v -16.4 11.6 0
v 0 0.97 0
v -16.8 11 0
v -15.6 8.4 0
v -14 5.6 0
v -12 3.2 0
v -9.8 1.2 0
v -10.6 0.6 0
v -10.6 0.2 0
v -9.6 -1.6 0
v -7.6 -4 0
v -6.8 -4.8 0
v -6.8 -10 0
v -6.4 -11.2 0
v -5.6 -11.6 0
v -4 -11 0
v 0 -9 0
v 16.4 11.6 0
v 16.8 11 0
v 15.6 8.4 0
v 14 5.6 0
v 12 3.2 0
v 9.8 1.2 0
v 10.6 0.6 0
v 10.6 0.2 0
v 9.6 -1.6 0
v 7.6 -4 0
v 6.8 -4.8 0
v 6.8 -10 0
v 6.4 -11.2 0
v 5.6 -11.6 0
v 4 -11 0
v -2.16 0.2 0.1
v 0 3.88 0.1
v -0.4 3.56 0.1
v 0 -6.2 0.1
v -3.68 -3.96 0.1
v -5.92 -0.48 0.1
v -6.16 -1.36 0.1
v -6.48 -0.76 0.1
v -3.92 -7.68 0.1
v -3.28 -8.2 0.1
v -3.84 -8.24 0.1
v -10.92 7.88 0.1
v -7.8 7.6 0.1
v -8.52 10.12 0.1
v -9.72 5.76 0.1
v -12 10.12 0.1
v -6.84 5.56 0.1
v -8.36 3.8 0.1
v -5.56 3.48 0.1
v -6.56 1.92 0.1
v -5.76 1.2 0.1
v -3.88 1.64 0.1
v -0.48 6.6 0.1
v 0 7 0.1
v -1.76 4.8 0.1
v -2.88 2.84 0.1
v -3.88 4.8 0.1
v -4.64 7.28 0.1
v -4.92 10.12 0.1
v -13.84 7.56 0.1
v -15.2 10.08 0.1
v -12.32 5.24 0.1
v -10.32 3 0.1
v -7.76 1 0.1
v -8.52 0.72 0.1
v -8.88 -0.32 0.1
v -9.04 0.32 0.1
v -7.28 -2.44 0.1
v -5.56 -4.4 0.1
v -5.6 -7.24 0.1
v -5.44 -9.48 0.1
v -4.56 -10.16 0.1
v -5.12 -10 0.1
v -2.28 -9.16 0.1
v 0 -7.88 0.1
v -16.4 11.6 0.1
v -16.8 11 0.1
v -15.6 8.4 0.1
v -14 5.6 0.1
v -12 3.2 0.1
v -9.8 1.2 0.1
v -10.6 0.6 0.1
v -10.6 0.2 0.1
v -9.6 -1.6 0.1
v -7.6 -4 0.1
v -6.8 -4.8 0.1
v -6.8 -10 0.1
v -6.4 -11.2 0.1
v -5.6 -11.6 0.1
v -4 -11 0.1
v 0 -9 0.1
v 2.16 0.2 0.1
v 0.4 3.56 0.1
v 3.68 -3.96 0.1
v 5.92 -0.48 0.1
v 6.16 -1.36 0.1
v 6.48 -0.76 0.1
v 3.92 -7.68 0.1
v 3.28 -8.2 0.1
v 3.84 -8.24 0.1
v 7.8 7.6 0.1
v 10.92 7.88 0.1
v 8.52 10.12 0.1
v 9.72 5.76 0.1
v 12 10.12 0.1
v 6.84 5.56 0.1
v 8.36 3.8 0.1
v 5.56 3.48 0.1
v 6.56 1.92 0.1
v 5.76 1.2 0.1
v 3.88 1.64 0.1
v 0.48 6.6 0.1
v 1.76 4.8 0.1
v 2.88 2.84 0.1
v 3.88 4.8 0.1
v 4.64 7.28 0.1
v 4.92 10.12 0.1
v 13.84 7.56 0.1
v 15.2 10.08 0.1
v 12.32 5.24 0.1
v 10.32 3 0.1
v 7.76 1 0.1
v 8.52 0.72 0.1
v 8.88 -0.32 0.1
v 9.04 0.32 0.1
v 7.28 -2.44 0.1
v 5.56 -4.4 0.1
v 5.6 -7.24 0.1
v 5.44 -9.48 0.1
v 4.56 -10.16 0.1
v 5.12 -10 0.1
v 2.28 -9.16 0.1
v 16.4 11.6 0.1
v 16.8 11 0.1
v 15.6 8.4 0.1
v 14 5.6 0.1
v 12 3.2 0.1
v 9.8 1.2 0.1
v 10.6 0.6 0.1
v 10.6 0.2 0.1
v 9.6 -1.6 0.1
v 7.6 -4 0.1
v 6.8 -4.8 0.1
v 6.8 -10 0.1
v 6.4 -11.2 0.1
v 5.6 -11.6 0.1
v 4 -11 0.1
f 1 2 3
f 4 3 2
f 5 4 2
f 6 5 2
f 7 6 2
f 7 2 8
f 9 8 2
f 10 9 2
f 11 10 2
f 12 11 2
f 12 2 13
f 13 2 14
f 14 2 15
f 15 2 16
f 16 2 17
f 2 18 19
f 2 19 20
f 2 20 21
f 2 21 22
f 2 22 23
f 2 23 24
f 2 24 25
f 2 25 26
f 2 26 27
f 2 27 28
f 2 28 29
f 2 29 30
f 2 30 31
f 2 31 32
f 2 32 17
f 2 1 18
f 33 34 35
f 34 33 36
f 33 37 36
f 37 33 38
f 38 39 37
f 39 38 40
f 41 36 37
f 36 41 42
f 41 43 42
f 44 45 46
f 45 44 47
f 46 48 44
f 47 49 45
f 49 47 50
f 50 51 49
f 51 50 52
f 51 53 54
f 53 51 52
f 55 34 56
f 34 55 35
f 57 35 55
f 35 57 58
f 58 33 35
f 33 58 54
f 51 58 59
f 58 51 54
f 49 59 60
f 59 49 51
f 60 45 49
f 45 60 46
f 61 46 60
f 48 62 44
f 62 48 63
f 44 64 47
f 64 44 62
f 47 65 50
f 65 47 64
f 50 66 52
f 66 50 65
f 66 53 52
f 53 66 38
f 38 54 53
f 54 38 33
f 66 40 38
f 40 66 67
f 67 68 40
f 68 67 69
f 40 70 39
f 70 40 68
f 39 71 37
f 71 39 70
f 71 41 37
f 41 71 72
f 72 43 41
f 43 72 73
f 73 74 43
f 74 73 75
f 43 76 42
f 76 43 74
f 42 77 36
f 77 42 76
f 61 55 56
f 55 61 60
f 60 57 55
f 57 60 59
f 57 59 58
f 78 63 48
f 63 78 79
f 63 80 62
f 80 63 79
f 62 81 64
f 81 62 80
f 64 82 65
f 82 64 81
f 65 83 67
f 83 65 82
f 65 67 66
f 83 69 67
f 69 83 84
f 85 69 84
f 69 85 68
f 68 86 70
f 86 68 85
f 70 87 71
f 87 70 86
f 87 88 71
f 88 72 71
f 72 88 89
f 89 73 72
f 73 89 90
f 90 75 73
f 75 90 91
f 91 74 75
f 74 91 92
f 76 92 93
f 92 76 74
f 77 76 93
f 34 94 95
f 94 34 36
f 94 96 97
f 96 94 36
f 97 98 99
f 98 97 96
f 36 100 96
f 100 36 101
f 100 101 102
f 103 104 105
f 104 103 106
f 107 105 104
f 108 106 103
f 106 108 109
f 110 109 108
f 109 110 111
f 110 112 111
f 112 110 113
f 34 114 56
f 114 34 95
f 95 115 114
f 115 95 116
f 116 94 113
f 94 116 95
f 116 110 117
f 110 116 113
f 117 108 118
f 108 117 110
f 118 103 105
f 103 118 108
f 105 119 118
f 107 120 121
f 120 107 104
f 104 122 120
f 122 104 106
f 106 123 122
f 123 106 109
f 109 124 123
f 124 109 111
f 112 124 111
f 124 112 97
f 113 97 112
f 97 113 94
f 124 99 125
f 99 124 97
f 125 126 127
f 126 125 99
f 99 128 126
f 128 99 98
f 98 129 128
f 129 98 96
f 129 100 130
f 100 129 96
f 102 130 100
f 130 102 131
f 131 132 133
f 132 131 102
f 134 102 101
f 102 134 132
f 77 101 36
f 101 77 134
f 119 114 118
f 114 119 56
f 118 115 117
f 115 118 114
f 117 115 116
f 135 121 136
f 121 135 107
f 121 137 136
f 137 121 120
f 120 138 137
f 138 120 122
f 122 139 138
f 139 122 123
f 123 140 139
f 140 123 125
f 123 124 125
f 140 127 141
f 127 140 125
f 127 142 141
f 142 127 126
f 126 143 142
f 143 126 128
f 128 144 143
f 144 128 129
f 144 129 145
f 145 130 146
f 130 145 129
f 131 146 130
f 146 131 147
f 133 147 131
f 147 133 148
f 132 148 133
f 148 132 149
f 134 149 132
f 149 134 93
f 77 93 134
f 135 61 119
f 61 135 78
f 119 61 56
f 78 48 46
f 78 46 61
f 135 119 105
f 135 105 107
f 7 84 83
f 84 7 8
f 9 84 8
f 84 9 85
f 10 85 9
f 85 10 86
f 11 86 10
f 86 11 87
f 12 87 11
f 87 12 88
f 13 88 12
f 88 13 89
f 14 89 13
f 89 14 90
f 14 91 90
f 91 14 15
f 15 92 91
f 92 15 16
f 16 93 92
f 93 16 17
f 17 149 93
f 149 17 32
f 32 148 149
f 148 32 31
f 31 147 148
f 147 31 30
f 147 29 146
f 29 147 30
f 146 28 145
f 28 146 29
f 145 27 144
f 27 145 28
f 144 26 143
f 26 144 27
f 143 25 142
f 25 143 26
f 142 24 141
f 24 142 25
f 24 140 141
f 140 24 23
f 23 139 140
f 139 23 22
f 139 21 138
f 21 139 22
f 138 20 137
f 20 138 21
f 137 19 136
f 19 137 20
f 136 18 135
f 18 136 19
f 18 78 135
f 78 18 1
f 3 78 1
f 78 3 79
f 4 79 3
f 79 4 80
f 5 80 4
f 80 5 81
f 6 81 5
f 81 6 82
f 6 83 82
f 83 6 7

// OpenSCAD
use <../lib.scad>
function ldraw_lib__4620855a() = [
// 0 Sticker  2.9 x  4.2 with Orange and Yellow Shooting Star
// 0 Name: 4620855a.dat
// 0 Author: Takeshi Takahashi [RainbowDolphin]
// 0 !LDRAW_ORG Part UPDATE 2020-03
// 0 !LICENSE Licensed under CC BY 2.0 and CC BY 4.0 : see CAreadme.txt
// 
// 0 BFC CERTIFY CCW
  [0,"BFC","CERTIFY"],
  [0,"BFC","CCW"],
// 
// 0 !KEYWORDS Car, Convertible, Set 3183, Vehicle
// 
// 0 !HISTORY 2020-12-29 [PTadmin] Official Update 2020-03
// 
// 
// 3 16 -41 0 29 0 0 2.426 -42 0 27.5
  [3,16,-41,0,29,0,0,2.426,-42,0,27.5],
// 3 16 -39 0 21 -42 0 27.5 0 0 2.426
  [3,16,-39,0,21,-42,0,27.5,0,0,2.426],
// 3 16 -35 0 14 -39 0 21 0 0 2.426
  [3,16,-35,0,14,-39,0,21,0,0,2.426],
// 3 16 -30 0 8 -35 0 14 0 0 2.426
  [3,16,-30,0,8,-35,0,14,0,0,2.426],
// 3 16 -24.5 0 3 -30 0 8 0 0 2.426
  [3,16,-24.5,0,3,-30,0,8,0,0,2.426],
// 3 16 -24.5 0 3 0 0 2.426 -26.5 0 1.5
  [3,16,-24.5,0,3,0,0,2.426,-26.5,0,1.5],
// 3 16 -26.5 0 .5 -26.5 0 1.5 0 0 2.426
  [3,16,-26.5,0,.5,-26.5,0,1.5,0,0,2.426],
// 3 16 -24 0 -4 -26.5 0 .5 0 0 2.426
  [3,16,-24,0,-4,-26.5,0,.5,0,0,2.426],
// 3 16 -19 0 -10 -24 0 -4 0 0 2.426
  [3,16,-19,0,-10,-24,0,-4,0,0,2.426],
// 3 16 -17 0 -12 -19 0 -10 0 0 2.426
  [3,16,-17,0,-12,-19,0,-10,0,0,2.426],
// 3 16 -17 0 -12 0 0 2.426 -17 0 -25
  [3,16,-17,0,-12,0,0,2.426,-17,0,-25],
// 3 16 -17 0 -25 0 0 2.426 -16 0 -28
  [3,16,-17,0,-25,0,0,2.426,-16,0,-28],
// 3 16 -16 0 -28 0 0 2.426 -14 0 -29
  [3,16,-16,0,-28,0,0,2.426,-14,0,-29],
// 3 16 -14 0 -29 0 0 2.426 -10 0 -27.5
  [3,16,-14,0,-29,0,0,2.426,-10,0,-27.5],
// 3 16 -10 0 -27.5 0 0 2.426 0 0 -22.5
  [3,16,-10,0,-27.5,0,0,2.426,0,0,-22.5],
// 3 16 0 0 2.426 41 0 29 42 0 27.5
  [3,16,0,0,2.426,41,0,29,42,0,27.5],
// 3 16 0 0 2.426 42 0 27.5 39 0 21
  [3,16,0,0,2.426,42,0,27.5,39,0,21],
// 3 16 0 0 2.426 39 0 21 35 0 14
  [3,16,0,0,2.426,39,0,21,35,0,14],
// 3 16 0 0 2.426 35 0 14 30 0 8
  [3,16,0,0,2.426,35,0,14,30,0,8],
// 3 16 0 0 2.426 30 0 8 24.5 0 3
  [3,16,0,0,2.426,30,0,8,24.5,0,3],
// 3 16 0 0 2.426 24.5 0 3 26.5 0 1.5
  [3,16,0,0,2.426,24.5,0,3,26.5,0,1.5],
// 3 16 0 0 2.426 26.5 0 1.5 26.5 0 .5
  [3,16,0,0,2.426,26.5,0,1.5,26.5,0,.5],
// 3 16 0 0 2.426 26.5 0 .5 24 0 -4
  [3,16,0,0,2.426,26.5,0,.5,24,0,-4],
// 3 16 0 0 2.426 24 0 -4 19 0 -10
  [3,16,0,0,2.426,24,0,-4,19,0,-10],
// 3 16 0 0 2.426 19 0 -10 17 0 -12
  [3,16,0,0,2.426,19,0,-10,17,0,-12],
// 3 16 0 0 2.426 17 0 -12 17 0 -25
  [3,16,0,0,2.426,17,0,-12,17,0,-25],
// 3 16 0 0 2.426 17 0 -25 16 0 -28
  [3,16,0,0,2.426,17,0,-25,16,0,-28],
// 3 16 0 0 2.426 16 0 -28 14 0 -29
  [3,16,0,0,2.426,16,0,-28,14,0,-29],
// 3 16 0 0 2.426 14 0 -29 10 0 -27.5
  [3,16,0,0,2.426,14,0,-29,10,0,-27.5],
// 3 16 0 0 2.426 10 0 -27.5 0 0 -22.5
  [3,16,0,0,2.426,10,0,-27.5,0,0,-22.5],
// 3 16 0 0 2.426 -41 0 29 41 0 29
  [3,16,0,0,2.426,-41,0,29,41,0,29],
// 4 25 0 -.25 -15.5 0 -.25 9.7 -1 -.25 8.9 -5.4 -.25 .5
  [4,25,0,-.25,-15.5,0,-.25,9.7,-1,-.25,8.9,-5.4,-.25,.5],
// 4 25 -9.2 -.25 -9.9 0 -.25 -15.5 -5.4 -.25 .5 -14.8 -.25 -1.2
  [4,25,-9.2,-.25,-9.9,0,-.25,-15.5,-5.4,-.25,.5,-14.8,-.25,-1.2],
// 4 25 -15.4 -.25 -3.4 -9.2 -.25 -9.9 -14.8 -.25 -1.2 -16.2 -.25 -1.9
  [4,25,-15.4,-.25,-3.4,-9.2,-.25,-9.9,-14.8,-.25,-1.2,-16.2,-.25,-1.9],
// 4 25 0 -.25 -15.5 -9.2 -.25 -9.9 -9.8 -.25 -19.2 -8.2 -.25 -20.5
  [4,25,0,-.25,-15.5,-9.2,-.25,-9.9,-9.8,-.25,-19.2,-8.2,-.25,-20.5],
// 3 25 -9.8 -.25 -19.2 -9.6 -.25 -20.6 -8.2 -.25 -20.5
  [3,25,-9.8,-.25,-19.2,-9.6,-.25,-20.6,-8.2,-.25,-20.5],
// 4 25 -27.3 -.25 19.7 -24.3 -.25 14.4 -19.5 -.25 19 -21.3 -.25 25.3
  [4,25,-27.3,-.25,19.7,-24.3,-.25,14.4,-19.5,-.25,19,-21.3,-.25,25.3],
// 3 25 -21.3 -.25 25.3 -30 -.25 25.3 -27.3 -.25 19.7
  [3,25,-21.3,-.25,25.3,-30,-.25,25.3,-27.3,-.25,19.7],
// 4 25 -17.1 -.25 13.9 -19.5 -.25 19 -24.3 -.25 14.4 -20.9 -.25 9.5
  [4,25,-17.1,-.25,13.9,-19.5,-.25,19,-24.3,-.25,14.4,-20.9,-.25,9.5],
// 4 25 -13.9 -.25 8.7 -17.1 -.25 13.9 -20.9 -.25 9.5 -16.4 -.25 4.8
  [4,25,-13.9,-.25,8.7,-17.1,-.25,13.9,-20.9,-.25,9.5,-16.4,-.25,4.8],
// 4 25 -9.7 -.25 4.1 -13.9 -.25 8.7 -16.4 -.25 4.8 -14.4 -.25 3
  [4,25,-9.7,-.25,4.1,-13.9,-.25,8.7,-16.4,-.25,4.8,-14.4,-.25,3],
// 4 14 0 -.25 9.7 0 -.25 17.5 -1.2 -.25 16.5 -1 -.25 8.9
  [4,14,0,-.25,9.7,0,-.25,17.5,-1.2,-.25,16.5,-1,-.25,8.9],
// 4 14 -1 -.25 8.9 -1.2 -.25 16.5 -4.4 -.25 12 -7.2 -.25 7.1
  [4,14,-1,-.25,8.9,-1.2,-.25,16.5,-4.4,-.25,12,-7.2,-.25,7.1],
// 4 14 -5.4 -.25 .5 -1 -.25 8.9 -7.2 -.25 7.1 -9.7 -.25 4.1
  [4,14,-5.4,-.25,.5,-1,-.25,8.9,-7.2,-.25,7.1,-9.7,-.25,4.1],
// 4 14 -13.9 -.25 8.7 -9.7 -.25 4.1 -7.2 -.25 7.1 -9.7 -.25 12
  [4,14,-13.9,-.25,8.7,-9.7,-.25,4.1,-7.2,-.25,7.1,-9.7,-.25,12],
// 4 14 -17.1 -.25 13.9 -13.9 -.25 8.7 -9.7 -.25 12 -11.6 -.25 18.2
  [4,14,-17.1,-.25,13.9,-13.9,-.25,8.7,-9.7,-.25,12,-11.6,-.25,18.2],
// 4 14 -19.5 -.25 19 -17.1 -.25 13.9 -11.6 -.25 18.2 -21.3 -.25 25.3
  [4,14,-19.5,-.25,19,-17.1,-.25,13.9,-11.6,-.25,18.2,-21.3,-.25,25.3],
// 3 14 -12.3 -.25 25.3 -21.3 -.25 25.3 -11.6 -.25 18.2
  [3,14,-12.3,-.25,25.3,-21.3,-.25,25.3,-11.6,-.25,18.2],
// 4 14 -27.3 -.25 19.7 -30 -.25 25.3 -38 -.25 25.2 -34.6 -.25 18.9
  [4,14,-27.3,-.25,19.7,-30,-.25,25.3,-38,-.25,25.2,-34.6,-.25,18.9],
// 4 14 -24.3 -.25 14.4 -27.3 -.25 19.7 -34.6 -.25 18.9 -30.8 -.25 13.1
  [4,14,-24.3,-.25,14.4,-27.3,-.25,19.7,-34.6,-.25,18.9,-30.8,-.25,13.1],
// 4 14 -20.9 -.25 9.5 -24.3 -.25 14.4 -30.8 -.25 13.1 -25.8 -.25 7.5
  [4,14,-20.9,-.25,9.5,-24.3,-.25,14.4,-30.8,-.25,13.1,-25.8,-.25,7.5],
// 4 14 -16.4 -.25 4.8 -20.9 -.25 9.5 -25.8 -.25 7.5 -19.4 -.25 2.5
  [4,14,-16.4,-.25,4.8,-20.9,-.25,9.5,-25.8,-.25,7.5,-19.4,-.25,2.5],
// 4 14 -14.4 -.25 3 -16.4 -.25 4.8 -19.4 -.25 2.5 -14.8 -.25 -1.2
  [4,14,-14.4,-.25,3,-16.4,-.25,4.8,-19.4,-.25,2.5,-14.8,-.25,-1.2],
// 4 14 -9.7 -.25 4.1 -14.4 -.25 3 -14.8 -.25 -1.2 -5.4 -.25 .5
  [4,14,-9.7,-.25,4.1,-14.4,-.25,3,-14.8,-.25,-1.2,-5.4,-.25,.5],
// 4 14 -16.2 -.25 -1.9 -14.8 -.25 -1.2 -19.4 -.25 2.5 -21.3 -.25 1.8
  [4,14,-16.2,-.25,-1.9,-14.8,-.25,-1.2,-19.4,-.25,2.5,-21.3,-.25,1.8],
// 4 14 -16.2 -.25 -1.9 -21.3 -.25 1.8 -22.6 -.25 .8 -22.2 -.25 -.8
  [4,14,-16.2,-.25,-1.9,-21.3,-.25,1.8,-22.6,-.25,.8,-22.2,-.25,-.8],
// 4 14 -15.4 -.25 -3.4 -16.2 -.25 -1.9 -22.2 -.25 -.8 -18.2 -.25 -6.1
  [4,14,-15.4,-.25,-3.4,-16.2,-.25,-1.9,-22.2,-.25,-.8,-18.2,-.25,-6.1],
// 4 14 -9.2 -.25 -9.9 -15.4 -.25 -3.4 -18.2 -.25 -6.1 -13.9 -.25 -11
  [4,14,-9.2,-.25,-9.9,-15.4,-.25,-3.4,-18.2,-.25,-6.1,-13.9,-.25,-11],
// 4 14 -9.8 -.25 -19.2 -9.2 -.25 -9.9 -13.9 -.25 -11 -14 -.25 -18.1
  [4,14,-9.8,-.25,-19.2,-9.2,-.25,-9.9,-13.9,-.25,-11,-14,-.25,-18.1],
// 4 14 -9.6 -.25 -20.6 -9.8 -.25 -19.2 -14 -.25 -18.1 -13.6 -.25 -23.7
  [4,14,-9.6,-.25,-20.6,-9.8,-.25,-19.2,-14,-.25,-18.1,-13.6,-.25,-23.7],
// 4 14 -9.6 -.25 -20.6 -13.6 -.25 -23.7 -12.8 -.25 -25 -11.4 -.25 -25.4
  [4,14,-9.6,-.25,-20.6,-13.6,-.25,-23.7,-12.8,-.25,-25,-11.4,-.25,-25.4],
// 4 14 -8.2 -.25 -20.5 -9.6 -.25 -20.6 -11.4 -.25 -25.4 -5.7 -.25 -22.9
  [4,14,-8.2,-.25,-20.5,-9.6,-.25,-20.6,-11.4,-.25,-25.4,-5.7,-.25,-22.9],
// 4 14 0 -.25 -15.5 -8.2 -.25 -20.5 -5.7 -.25 -22.9 0 -.25 -19.7
  [4,14,0,-.25,-15.5,-8.2,-.25,-20.5,-5.7,-.25,-22.9,0,-.25,-19.7],
// 4 30 0 -.25 17.5 -12.3 -.25 25.3 -11.6 -.25 18.2 -1.2 -.25 16.5
  [4,30,0,-.25,17.5,-12.3,-.25,25.3,-11.6,-.25,18.2,-1.2,-.25,16.5],
// 4 30 -1.2 -.25 16.5 -11.6 -.25 18.2 -9.7 -.25 12 -4.4 -.25 12
  [4,30,-1.2,-.25,16.5,-11.6,-.25,18.2,-9.7,-.25,12,-4.4,-.25,12],
// 3 30 -4.4 -.25 12 -9.7 -.25 12 -7.2 -.25 7.1
  [3,30,-4.4,-.25,12,-9.7,-.25,12,-7.2,-.25,7.1],
// 4 30 -38 -.25 25.2 -30 -.25 25.3 -41 -.25 29 -42 -.25 27.5
  [4,30,-38,-.25,25.2,-30,-.25,25.3,-41,-.25,29,-42,-.25,27.5],
// 4 30 -38 -.25 25.2 -42 -.25 27.5 -39 -.25 21 -34.6 -.25 18.9
  [4,30,-38,-.25,25.2,-42,-.25,27.5,-39,-.25,21,-34.6,-.25,18.9],
// 4 30 -34.6 -.25 18.9 -39 -.25 21 -35 -.25 14 -30.8 -.25 13.1
  [4,30,-34.6,-.25,18.9,-39,-.25,21,-35,-.25,14,-30.8,-.25,13.1],
// 4 30 -30.8 -.25 13.1 -35 -.25 14 -30 -.25 8 -25.8 -.25 7.5
  [4,30,-30.8,-.25,13.1,-35,-.25,14,-30,-.25,8,-25.8,-.25,7.5],
// 4 30 -25.8 -.25 7.5 -30 -.25 8 -24.5 -.25 3 -21.3 -.25 1.8
  [4,30,-25.8,-.25,7.5,-30,-.25,8,-24.5,-.25,3,-21.3,-.25,1.8],
// 3 30 -25.8 -.25 7.5 -21.3 -.25 1.8 -19.4 -.25 2.5
  [3,30,-25.8,-.25,7.5,-21.3,-.25,1.8,-19.4,-.25,2.5],
// 4 30 -22.6 -.25 .8 -21.3 -.25 1.8 -24.5 -.25 3 -26.5 -.25 1.5
  [4,30,-22.6,-.25,.8,-21.3,-.25,1.8,-24.5,-.25,3,-26.5,-.25,1.5],
// 4 30 -22.6 -.25 .8 -26.5 -.25 1.5 -26.5 -.25 .5 -22.2 -.25 -.8
  [4,30,-22.6,-.25,.8,-26.5,-.25,1.5,-26.5,-.25,.5,-22.2,-.25,-.8],
// 4 30 -22.2 -.25 -.8 -26.5 -.25 .5 -24 -.25 -4 -18.2 -.25 -6.1
  [4,30,-22.2,-.25,-.8,-26.5,-.25,.5,-24,-.25,-4,-18.2,-.25,-6.1],
// 4 30 -18.2 -.25 -6.1 -24 -.25 -4 -19 -.25 -10 -13.9 -.25 -11
  [4,30,-18.2,-.25,-6.1,-24,-.25,-4,-19,-.25,-10,-13.9,-.25,-11],
// 3 30 -19 -.25 -10 -17 -.25 -12 -13.9 -.25 -11
  [3,30,-19,-.25,-10,-17,-.25,-12,-13.9,-.25,-11],
// 4 30 -14 -.25 -18.1 -13.9 -.25 -11 -17 -.25 -12 -17 -.25 -25
  [4,30,-14,-.25,-18.1,-13.9,-.25,-11,-17,-.25,-12,-17,-.25,-25],
// 4 30 -13.6 -.25 -23.7 -14 -.25 -18.1 -17 -.25 -25 -16 -.25 -28
  [4,30,-13.6,-.25,-23.7,-14,-.25,-18.1,-17,-.25,-25,-16,-.25,-28],
// 4 30 -12.8 -.25 -25 -13.6 -.25 -23.7 -16 -.25 -28 -14 -.25 -29
  [4,30,-12.8,-.25,-25,-13.6,-.25,-23.7,-16,-.25,-28,-14,-.25,-29],
// 4 30 -11.4 -.25 -25.4 -12.8 -.25 -25 -14 -.25 -29 -10 -.25 -27.5
  [4,30,-11.4,-.25,-25.4,-12.8,-.25,-25,-14,-.25,-29,-10,-.25,-27.5],
// 4 30 -5.7 -.25 -22.9 -11.4 -.25 -25.4 -10 -.25 -27.5 0 -.25 -22.5
  [4,30,-5.7,-.25,-22.9,-11.4,-.25,-25.4,-10,-.25,-27.5,0,-.25,-22.5],
// 3 30 0 -.25 -19.7 -5.7 -.25 -22.9 0 -.25 -22.5
  [3,30,0,-.25,-19.7,-5.7,-.25,-22.9,0,-.25,-22.5],
// 4 25 1 -.25 8.9 0 -.25 9.7 0 -.25 -15.5 5.4 -.25 .5
  [4,25,1,-.25,8.9,0,-.25,9.7,0,-.25,-15.5,5.4,-.25,.5],
// 4 25 5.4 -.25 .5 0 -.25 -15.5 9.2 -.25 -9.9 14.8 -.25 -1.2
  [4,25,5.4,-.25,.5,0,-.25,-15.5,9.2,-.25,-9.9,14.8,-.25,-1.2],
// 4 25 14.8 -.25 -1.2 9.2 -.25 -9.9 15.4 -.25 -3.4 16.2 -.25 -1.9
  [4,25,14.8,-.25,-1.2,9.2,-.25,-9.9,15.4,-.25,-3.4,16.2,-.25,-1.9],
// 4 25 9.8 -.25 -19.2 9.2 -.25 -9.9 0 -.25 -15.5 8.2 -.25 -20.5
  [4,25,9.8,-.25,-19.2,9.2,-.25,-9.9,0,-.25,-15.5,8.2,-.25,-20.5],
// 3 25 9.8 -.25 -19.2 8.2 -.25 -20.5 9.6 -.25 -20.6
  [3,25,9.8,-.25,-19.2,8.2,-.25,-20.5,9.6,-.25,-20.6],
// 4 25 19.5 -.25 19 24.3 -.25 14.4 27.3 -.25 19.7 21.3 -.25 25.3
  [4,25,19.5,-.25,19,24.3,-.25,14.4,27.3,-.25,19.7,21.3,-.25,25.3],
// 3 25 30 -.25 25.3 21.3 -.25 25.3 27.3 -.25 19.7
  [3,25,30,-.25,25.3,21.3,-.25,25.3,27.3,-.25,19.7],
// 4 25 24.3 -.25 14.4 19.5 -.25 19 17.1 -.25 13.9 20.9 -.25 9.5
  [4,25,24.3,-.25,14.4,19.5,-.25,19,17.1,-.25,13.9,20.9,-.25,9.5],
// 4 25 20.9 -.25 9.5 17.1 -.25 13.9 13.9 -.25 8.7 16.4 -.25 4.8
  [4,25,20.9,-.25,9.5,17.1,-.25,13.9,13.9,-.25,8.7,16.4,-.25,4.8],
// 4 25 16.4 -.25 4.8 13.9 -.25 8.7 9.7 -.25 4.1 14.4 -.25 3
  [4,25,16.4,-.25,4.8,13.9,-.25,8.7,9.7,-.25,4.1,14.4,-.25,3],
// 4 14 1.2 -.25 16.5 0 -.25 17.5 0 -.25 9.7 1 -.25 8.9
  [4,14,1.2,-.25,16.5,0,-.25,17.5,0,-.25,9.7,1,-.25,8.9],
// 4 14 4.4 -.25 12 1.2 -.25 16.5 1 -.25 8.9 7.2 -.25 7.1
  [4,14,4.4,-.25,12,1.2,-.25,16.5,1,-.25,8.9,7.2,-.25,7.1],
// 4 14 7.2 -.25 7.1 1 -.25 8.9 5.4 -.25 .5 9.7 -.25 4.1
  [4,14,7.2,-.25,7.1,1,-.25,8.9,5.4,-.25,.5,9.7,-.25,4.1],
// 4 14 7.2 -.25 7.1 9.7 -.25 4.1 13.9 -.25 8.7 9.7 -.25 12
  [4,14,7.2,-.25,7.1,9.7,-.25,4.1,13.9,-.25,8.7,9.7,-.25,12],
// 4 14 9.7 -.25 12 13.9 -.25 8.7 17.1 -.25 13.9 11.6 -.25 18.2
  [4,14,9.7,-.25,12,13.9,-.25,8.7,17.1,-.25,13.9,11.6,-.25,18.2],
// 4 14 11.6 -.25 18.2 17.1 -.25 13.9 19.5 -.25 19 21.3 -.25 25.3
  [4,14,11.6,-.25,18.2,17.1,-.25,13.9,19.5,-.25,19,21.3,-.25,25.3],
// 3 14 21.3 -.25 25.3 12.3 -.25 25.3 11.6 -.25 18.2
  [3,14,21.3,-.25,25.3,12.3,-.25,25.3,11.6,-.25,18.2],
// 4 14 38 -.25 25.2 30 -.25 25.3 27.3 -.25 19.7 34.6 -.25 18.9
  [4,14,38,-.25,25.2,30,-.25,25.3,27.3,-.25,19.7,34.6,-.25,18.9],
// 4 14 34.6 -.25 18.9 27.3 -.25 19.7 24.3 -.25 14.4 30.8 -.25 13.1
  [4,14,34.6,-.25,18.9,27.3,-.25,19.7,24.3,-.25,14.4,30.8,-.25,13.1],
// 4 14 30.8 -.25 13.1 24.3 -.25 14.4 20.9 -.25 9.5 25.8 -.25 7.5
  [4,14,30.8,-.25,13.1,24.3,-.25,14.4,20.9,-.25,9.5,25.8,-.25,7.5],
// 4 14 25.8 -.25 7.5 20.9 -.25 9.5 16.4 -.25 4.8 19.4 -.25 2.5
  [4,14,25.8,-.25,7.5,20.9,-.25,9.5,16.4,-.25,4.8,19.4,-.25,2.5],
// 4 14 19.4 -.25 2.5 16.4 -.25 4.8 14.4 -.25 3 14.8 -.25 -1.2
  [4,14,19.4,-.25,2.5,16.4,-.25,4.8,14.4,-.25,3,14.8,-.25,-1.2],
// 4 14 14.8 -.25 -1.2 14.4 -.25 3 9.7 -.25 4.1 5.4 -.25 .5
  [4,14,14.8,-.25,-1.2,14.4,-.25,3,9.7,-.25,4.1,5.4,-.25,.5],
// 4 14 19.4 -.25 2.5 14.8 -.25 -1.2 16.2 -.25 -1.9 21.3 -.25 1.8
  [4,14,19.4,-.25,2.5,14.8,-.25,-1.2,16.2,-.25,-1.9,21.3,-.25,1.8],
// 4 14 22.6 -.25 .8 21.3 -.25 1.8 16.2 -.25 -1.9 22.2 -.25 -.8
  [4,14,22.6,-.25,.8,21.3,-.25,1.8,16.2,-.25,-1.9,22.2,-.25,-.8],
// 4 14 22.2 -.25 -.8 16.2 -.25 -1.9 15.4 -.25 -3.4 18.2 -.25 -6.1
  [4,14,22.2,-.25,-.8,16.2,-.25,-1.9,15.4,-.25,-3.4,18.2,-.25,-6.1],
// 4 14 18.2 -.25 -6.1 15.4 -.25 -3.4 9.2 -.25 -9.9 13.9 -.25 -11
  [4,14,18.2,-.25,-6.1,15.4,-.25,-3.4,9.2,-.25,-9.9,13.9,-.25,-11],
// 4 14 13.9 -.25 -11 9.2 -.25 -9.9 9.8 -.25 -19.2 14 -.25 -18.1
  [4,14,13.9,-.25,-11,9.2,-.25,-9.9,9.8,-.25,-19.2,14,-.25,-18.1],
// 4 14 14 -.25 -18.1 9.8 -.25 -19.2 9.6 -.25 -20.6 13.6 -.25 -23.7
  [4,14,14,-.25,-18.1,9.8,-.25,-19.2,9.6,-.25,-20.6,13.6,-.25,-23.7],
// 4 14 12.8 -.25 -25 13.6 -.25 -23.7 9.6 -.25 -20.6 11.4 -.25 -25.4
  [4,14,12.8,-.25,-25,13.6,-.25,-23.7,9.6,-.25,-20.6,11.4,-.25,-25.4],
// 4 14 11.4 -.25 -25.4 9.6 -.25 -20.6 8.2 -.25 -20.5 5.7 -.25 -22.9
  [4,14,11.4,-.25,-25.4,9.6,-.25,-20.6,8.2,-.25,-20.5,5.7,-.25,-22.9],
// 4 14 5.7 -.25 -22.9 8.2 -.25 -20.5 0 -.25 -15.5 0 -.25 -19.7
  [4,14,5.7,-.25,-22.9,8.2,-.25,-20.5,0,-.25,-15.5,0,-.25,-19.7],
// 4 30 11.6 -.25 18.2 12.3 -.25 25.3 0 -.25 17.5 1.2 -.25 16.5
  [4,30,11.6,-.25,18.2,12.3,-.25,25.3,0,-.25,17.5,1.2,-.25,16.5],
// 4 30 9.7 -.25 12 11.6 -.25 18.2 1.2 -.25 16.5 4.4 -.25 12
  [4,30,9.7,-.25,12,11.6,-.25,18.2,1.2,-.25,16.5,4.4,-.25,12],
// 3 30 9.7 -.25 12 4.4 -.25 12 7.2 -.25 7.1
  [3,30,9.7,-.25,12,4.4,-.25,12,7.2,-.25,7.1],
// 4 30 41 -.25 29 30 -.25 25.3 38 -.25 25.2 42 -.25 27.5
  [4,30,41,-.25,29,30,-.25,25.3,38,-.25,25.2,42,-.25,27.5],
// 4 30 39 -.25 21 42 -.25 27.5 38 -.25 25.2 34.6 -.25 18.9
  [4,30,39,-.25,21,42,-.25,27.5,38,-.25,25.2,34.6,-.25,18.9],
// 4 30 35 -.25 14 39 -.25 21 34.6 -.25 18.9 30.8 -.25 13.1
  [4,30,35,-.25,14,39,-.25,21,34.6,-.25,18.9,30.8,-.25,13.1],
// 4 30 30 -.25 8 35 -.25 14 30.8 -.25 13.1 25.8 -.25 7.5
  [4,30,30,-.25,8,35,-.25,14,30.8,-.25,13.1,25.8,-.25,7.5],
// 4 30 24.5 -.25 3 30 -.25 8 25.8 -.25 7.5 21.3 -.25 1.8
  [4,30,24.5,-.25,3,30,-.25,8,25.8,-.25,7.5,21.3,-.25,1.8],
// 3 30 25.8 -.25 7.5 19.4 -.25 2.5 21.3 -.25 1.8
  [3,30,25.8,-.25,7.5,19.4,-.25,2.5,21.3,-.25,1.8],
// 4 30 24.5 -.25 3 21.3 -.25 1.8 22.6 -.25 .8 26.5 -.25 1.5
  [4,30,24.5,-.25,3,21.3,-.25,1.8,22.6,-.25,.8,26.5,-.25,1.5],
// 4 30 26.5 -.25 .5 26.5 -.25 1.5 22.6 -.25 .8 22.2 -.25 -.8
  [4,30,26.5,-.25,.5,26.5,-.25,1.5,22.6,-.25,.8,22.2,-.25,-.8],
// 4 30 24 -.25 -4 26.5 -.25 .5 22.2 -.25 -.8 18.2 -.25 -6.1
  [4,30,24,-.25,-4,26.5,-.25,.5,22.2,-.25,-.8,18.2,-.25,-6.1],
// 4 30 19 -.25 -10 24 -.25 -4 18.2 -.25 -6.1 13.9 -.25 -11
  [4,30,19,-.25,-10,24,-.25,-4,18.2,-.25,-6.1,13.9,-.25,-11],
// 3 30 19 -.25 -10 13.9 -.25 -11 17 -.25 -12
  [3,30,19,-.25,-10,13.9,-.25,-11,17,-.25,-12],
// 4 30 17 -.25 -12 13.9 -.25 -11 14 -.25 -18.1 17 -.25 -25
  [4,30,17,-.25,-12,13.9,-.25,-11,14,-.25,-18.1,17,-.25,-25],
// 4 30 17 -.25 -25 14 -.25 -18.1 13.6 -.25 -23.7 16 -.25 -28
  [4,30,17,-.25,-25,14,-.25,-18.1,13.6,-.25,-23.7,16,-.25,-28],
// 4 30 16 -.25 -28 13.6 -.25 -23.7 12.8 -.25 -25 14 -.25 -29
  [4,30,16,-.25,-28,13.6,-.25,-23.7,12.8,-.25,-25,14,-.25,-29],
// 4 30 14 -.25 -29 12.8 -.25 -25 11.4 -.25 -25.4 10 -.25 -27.5
  [4,30,14,-.25,-29,12.8,-.25,-25,11.4,-.25,-25.4,10,-.25,-27.5],
// 4 30 10 -.25 -27.5 11.4 -.25 -25.4 5.7 -.25 -22.9 0 -.25 -22.5
  [4,30,10,-.25,-27.5,11.4,-.25,-25.4,5.7,-.25,-22.9,0,-.25,-22.5],
// 3 30 0 -.25 -19.7 0 -.25 -22.5 5.7 -.25 -22.9
  [3,30,0,-.25,-19.7,0,-.25,-22.5,5.7,-.25,-22.9],
// 4 30 -41 -.25 29 -12.3 -.25 25.3 12.3 -.25 25.3 41 -.25 29
  [4,30,-41,-.25,29,-12.3,-.25,25.3,12.3,-.25,25.3,41,-.25,29],
// 3 30 12.3 -.25 25.3 -12.3 -.25 25.3 0 -.25 17.5
  [3,30,12.3,-.25,25.3,-12.3,-.25,25.3,0,-.25,17.5],
// 3 30 -41 -.25 29 -30 -.25 25.3 -21.3 -.25 25.3
  [3,30,-41,-.25,29,-30,-.25,25.3,-21.3,-.25,25.3],
// 3 30 -41 -.25 29 -21.3 -.25 25.3 -12.3 -.25 25.3
  [3,30,-41,-.25,29,-21.3,-.25,25.3,-12.3,-.25,25.3],
// 3 30 41 -.25 29 12.3 -.25 25.3 21.3 -.25 25.3
  [3,30,41,-.25,29,12.3,-.25,25.3,21.3,-.25,25.3],
// 3 30 41 -.25 29 21.3 -.25 25.3 30 -.25 25.3
  [3,30,41,-.25,29,21.3,-.25,25.3,30,-.25,25.3],
// 4 16 -26.5 0 1.5 -26.5 -.25 1.5 -24.5 -.25 3 -24.5 0 3
  [4,16,-26.5,0,1.5,-26.5,-.25,1.5,-24.5,-.25,3,-24.5,0,3],
// 4 16 -26.5 0 .5 -26.5 -.25 .5 -26.5 -.25 1.5 -26.5 0 1.5
  [4,16,-26.5,0,.5,-26.5,-.25,.5,-26.5,-.25,1.5,-26.5,0,1.5],
// 4 16 -24 0 -4 -24 -.25 -4 -26.5 -.25 .5 -26.5 0 .5
  [4,16,-24,0,-4,-24,-.25,-4,-26.5,-.25,.5,-26.5,0,.5],
// 4 16 -19 0 -10 -19 -.25 -10 -24 -.25 -4 -24 0 -4
  [4,16,-19,0,-10,-19,-.25,-10,-24,-.25,-4,-24,0,-4],
// 4 16 -17 0 -12 -17 -.25 -12 -19 -.25 -10 -19 0 -10
  [4,16,-17,0,-12,-17,-.25,-12,-19,-.25,-10,-19,0,-10],
// 4 16 -17 0 -25 -17 -.25 -25 -17 -.25 -12 -17 0 -12
  [4,16,-17,0,-25,-17,-.25,-25,-17,-.25,-12,-17,0,-12],
// 4 16 -16 0 -28 -16 -.25 -28 -17 -.25 -25 -17 0 -25
  [4,16,-16,0,-28,-16,-.25,-28,-17,-.25,-25,-17,0,-25],
// 4 16 -14 0 -29 -14 -.25 -29 -16 -.25 -28 -16 0 -28
  [4,16,-14,0,-29,-14,-.25,-29,-16,-.25,-28,-16,0,-28],
// 4 16 -10 0 -27.5 -10 -.25 -27.5 -14 -.25 -29 -14 0 -29
  [4,16,-10,0,-27.5,-10,-.25,-27.5,-14,-.25,-29,-14,0,-29],
// 4 16 0 0 -22.5 0 -.25 -22.5 -10 -.25 -27.5 -10 0 -27.5
  [4,16,0,0,-22.5,0,-.25,-22.5,-10,-.25,-27.5,-10,0,-27.5],
// 4 16 10 0 -27.5 10 -.25 -27.5 0 -.25 -22.5 0 0 -22.5
  [4,16,10,0,-27.5,10,-.25,-27.5,0,-.25,-22.5,0,0,-22.5],
// 4 16 14 0 -29 14 -.25 -29 10 -.25 -27.5 10 0 -27.5
  [4,16,14,0,-29,14,-.25,-29,10,-.25,-27.5,10,0,-27.5],
// 4 16 16 0 -28 16 -.25 -28 14 -.25 -29 14 0 -29
  [4,16,16,0,-28,16,-.25,-28,14,-.25,-29,14,0,-29],
// 4 16 17 0 -25 17 -.25 -25 16 -.25 -28 16 0 -28
  [4,16,17,0,-25,17,-.25,-25,16,-.25,-28,16,0,-28],
// 4 16 17 0 -12 17 -.25 -12 17 -.25 -25 17 0 -25
  [4,16,17,0,-12,17,-.25,-12,17,-.25,-25,17,0,-25],
// 4 16 19 0 -10 19 -.25 -10 17 -.25 -12 17 0 -12
  [4,16,19,0,-10,19,-.25,-10,17,-.25,-12,17,0,-12],
// 4 16 24 0 -4 24 -.25 -4 19 -.25 -10 19 0 -10
  [4,16,24,0,-4,24,-.25,-4,19,-.25,-10,19,0,-10],
// 4 16 26.5 0 .5 26.5 -.25 .5 24 -.25 -4 24 0 -4
  [4,16,26.5,0,.5,26.5,-.25,.5,24,-.25,-4,24,0,-4],
// 4 16 26.5 0 1.5 26.5 -.25 1.5 26.5 -.25 .5 26.5 0 .5
  [4,16,26.5,0,1.5,26.5,-.25,1.5,26.5,-.25,.5,26.5,0,.5],
// 4 16 24.5 0 3 24.5 -.25 3 26.5 -.25 1.5 26.5 0 1.5
  [4,16,24.5,0,3,24.5,-.25,3,26.5,-.25,1.5,26.5,0,1.5],
// 4 16 30 0 8 30 -.25 8 24.5 -.25 3 24.5 0 3
  [4,16,30,0,8,30,-.25,8,24.5,-.25,3,24.5,0,3],
// 4 16 35 0 14 35 -.25 14 30 -.25 8 30 0 8
  [4,16,35,0,14,35,-.25,14,30,-.25,8,30,0,8],
// 4 16 39 0 21 39 -.25 21 35 -.25 14 35 0 14
  [4,16,39,0,21,39,-.25,21,35,-.25,14,35,0,14],
// 4 16 42 0 27.5 42 -.25 27.5 39 -.25 21 39 0 21
  [4,16,42,0,27.5,42,-.25,27.5,39,-.25,21,39,0,21],
// 4 16 41 0 29 41 -.25 29 42 -.25 27.5 42 0 27.5
  [4,16,41,0,29,41,-.25,29,42,-.25,27.5,42,0,27.5],
// 4 16 -41 0 29 -41 -.25 29 41 -.25 29 41 0 29
  [4,16,-41,0,29,-41,-.25,29,41,-.25,29,41,0,29],
// 4 16 -42 0 27.5 -42 -.25 27.5 -41 -.25 29 -41 0 29
  [4,16,-42,0,27.5,-42,-.25,27.5,-41,-.25,29,-41,0,29],
// 4 16 -39 0 21 -39 -.25 21 -42 -.25 27.5 -42 0 27.5
  [4,16,-39,0,21,-39,-.25,21,-42,-.25,27.5,-42,0,27.5],
// 4 16 -35 0 14 -35 -.25 14 -39 -.25 21 -39 0 21
  [4,16,-35,0,14,-35,-.25,14,-39,-.25,21,-39,0,21],
// 4 16 -30 0 8 -30 -.25 8 -35 -.25 14 -35 0 14
  [4,16,-30,0,8,-30,-.25,8,-35,-.25,14,-35,0,14],
// 4 16 -24.5 0 3 -24.5 -.25 3 -30 -.25 8 -30 0 8
  [4,16,-24.5,0,3,-24.5,-.25,3,-30,-.25,8,-30,0,8],
// 5 24 30 -.25 8 30 0 8 35 -.25 14 24.5 -.25 3
  [5,24,30,-.25,8,30,0,8,35,-.25,14,24.5,-.25,3],
// 5 24 35 -.25 14 35 0 14 39 -.25 21 30 -.25 8
  [5,24,35,-.25,14,35,0,14,39,-.25,21,30,-.25,8],
// 5 24 39 -.25 21 39 0 21 42 -.25 27.5 35 -.25 14
  [5,24,39,-.25,21,39,0,21,42,-.25,27.5,35,-.25,14],
// 5 24 42 -.25 27.5 42 0 27.5 41 -.25 29 39 -.25 21
  [5,24,42,-.25,27.5,42,0,27.5,41,-.25,29,39,-.25,21],
// 5 24 41 -.25 29 41 0 29 -41 -.25 29 42 -.25 27.5
  [5,24,41,-.25,29,41,0,29,-41,-.25,29,42,-.25,27.5],
// 5 24 -41 -.25 29 -41 0 29 -42 -.25 27.5 41 -.25 29
  [5,24,-41,-.25,29,-41,0,29,-42,-.25,27.5,41,-.25,29],
// 5 24 -42 -.25 27.5 -42 0 27.5 -39 -.25 21 -41 -.25 29
  [5,24,-42,-.25,27.5,-42,0,27.5,-39,-.25,21,-41,-.25,29],
// 5 24 -39 -.25 21 -39 0 21 -35 -.25 14 -42 -.25 27.5
  [5,24,-39,-.25,21,-39,0,21,-35,-.25,14,-42,-.25,27.5],
// 5 24 -35 -.25 14 -35 0 14 -30 -.25 8 -39 -.25 21
  [5,24,-35,-.25,14,-35,0,14,-30,-.25,8,-39,-.25,21],
// 5 24 -30 -.25 8 -30 0 8 -24.5 -.25 3 -35 -.25 14
  [5,24,-30,-.25,8,-30,0,8,-24.5,-.25,3,-35,-.25,14],
// 5 24 -26.5 -.25 1.5 -26.5 0 1.5 -26.5 -.25 .5 -24.5 -.25 3
  [5,24,-26.5,-.25,1.5,-26.5,0,1.5,-26.5,-.25,.5,-24.5,-.25,3],
// 5 24 -26.5 -.25 .5 -26.5 0 .5 -24 -.25 -4 -26.5 -.25 1.5
  [5,24,-26.5,-.25,.5,-26.5,0,.5,-24,-.25,-4,-26.5,-.25,1.5],
// 5 24 -24 -.25 -4 -24 0 -4 -19 -.25 -10 -26.5 -.25 .5
  [5,24,-24,-.25,-4,-24,0,-4,-19,-.25,-10,-26.5,-.25,.5],
// 5 24 -19 -.25 -10 -19 0 -10 -17 -.25 -12 -24 -.25 -4
  [5,24,-19,-.25,-10,-19,0,-10,-17,-.25,-12,-24,-.25,-4],
// 5 24 -17 -.25 -12 -17 0 -12 -17 -.25 -25 -19 -.25 -10
  [5,24,-17,-.25,-12,-17,0,-12,-17,-.25,-25,-19,-.25,-10],
// 5 24 -17 -.25 -25 -17 0 -25 -16 -.25 -28 -17 -.25 -12
  [5,24,-17,-.25,-25,-17,0,-25,-16,-.25,-28,-17,-.25,-12],
// 5 24 -16 -.25 -28 -16 0 -28 -14 -.25 -29 -17 -.25 -25
  [5,24,-16,-.25,-28,-16,0,-28,-14,-.25,-29,-17,-.25,-25],
// 5 24 -14 -.25 -29 -14 0 -29 -10 -.25 -27.5 -16 -.25 -28
  [5,24,-14,-.25,-29,-14,0,-29,-10,-.25,-27.5,-16,-.25,-28],
// 5 24 -10 -.25 -27.5 -10 0 -27.5 0 -.25 -22.5 -14 -.25 -29
  [5,24,-10,-.25,-27.5,-10,0,-27.5,0,-.25,-22.5,-14,-.25,-29],
// 5 24 0 -.25 -22.5 0 0 -22.5 10 -.25 -27.5 -10 -.25 -27.5
  [5,24,0,-.25,-22.5,0,0,-22.5,10,-.25,-27.5,-10,-.25,-27.5],
// 5 24 10 -.25 -27.5 10 0 -27.5 14 -.25 -29 0 -.25 -22.5
  [5,24,10,-.25,-27.5,10,0,-27.5,14,-.25,-29,0,-.25,-22.5],
// 5 24 14 -.25 -29 14 0 -29 16 -.25 -28 10 -.25 -27.5
  [5,24,14,-.25,-29,14,0,-29,16,-.25,-28,10,-.25,-27.5],
// 5 24 16 -.25 -28 16 0 -28 17 -.25 -25 14 -.25 -29
  [5,24,16,-.25,-28,16,0,-28,17,-.25,-25,14,-.25,-29],
// 5 24 17 -.25 -25 17 0 -25 17 -.25 -12 16 -.25 -28
  [5,24,17,-.25,-25,17,0,-25,17,-.25,-12,16,-.25,-28],
// 5 24 17 -.25 -12 17 0 -12 19 -.25 -10 17 -.25 -25
  [5,24,17,-.25,-12,17,0,-12,19,-.25,-10,17,-.25,-25],
// 5 24 19 -.25 -10 19 0 -10 24 -.25 -4 17 -.25 -12
  [5,24,19,-.25,-10,19,0,-10,24,-.25,-4,17,-.25,-12],
// 5 24 24 -.25 -4 24 0 -4 26.5 -.25 .5 19 -.25 -10
  [5,24,24,-.25,-4,24,0,-4,26.5,-.25,.5,19,-.25,-10],
// 5 24 26.5 -.25 .5 26.5 0 .5 26.5 -.25 1.5 24 -.25 -4
  [5,24,26.5,-.25,.5,26.5,0,.5,26.5,-.25,1.5,24,-.25,-4],
// 5 24 26.5 -.25 1.5 26.5 0 1.5 26.5 -.25 .5 24.5 -.25 3
  [5,24,26.5,-.25,1.5,26.5,0,1.5,26.5,-.25,.5,24.5,-.25,3],
];
module ldraw_lib__4620855a(step=0, col=false, unit=2/5, alt=false, line=0.2, solid=!$preview)
    makepoly(ldraw_lib__4620855a(), step=step, col=col, unit=unit, alt=alt, line=line, solid=solid);
ldraw_lib__4620855a(line=0.2);
